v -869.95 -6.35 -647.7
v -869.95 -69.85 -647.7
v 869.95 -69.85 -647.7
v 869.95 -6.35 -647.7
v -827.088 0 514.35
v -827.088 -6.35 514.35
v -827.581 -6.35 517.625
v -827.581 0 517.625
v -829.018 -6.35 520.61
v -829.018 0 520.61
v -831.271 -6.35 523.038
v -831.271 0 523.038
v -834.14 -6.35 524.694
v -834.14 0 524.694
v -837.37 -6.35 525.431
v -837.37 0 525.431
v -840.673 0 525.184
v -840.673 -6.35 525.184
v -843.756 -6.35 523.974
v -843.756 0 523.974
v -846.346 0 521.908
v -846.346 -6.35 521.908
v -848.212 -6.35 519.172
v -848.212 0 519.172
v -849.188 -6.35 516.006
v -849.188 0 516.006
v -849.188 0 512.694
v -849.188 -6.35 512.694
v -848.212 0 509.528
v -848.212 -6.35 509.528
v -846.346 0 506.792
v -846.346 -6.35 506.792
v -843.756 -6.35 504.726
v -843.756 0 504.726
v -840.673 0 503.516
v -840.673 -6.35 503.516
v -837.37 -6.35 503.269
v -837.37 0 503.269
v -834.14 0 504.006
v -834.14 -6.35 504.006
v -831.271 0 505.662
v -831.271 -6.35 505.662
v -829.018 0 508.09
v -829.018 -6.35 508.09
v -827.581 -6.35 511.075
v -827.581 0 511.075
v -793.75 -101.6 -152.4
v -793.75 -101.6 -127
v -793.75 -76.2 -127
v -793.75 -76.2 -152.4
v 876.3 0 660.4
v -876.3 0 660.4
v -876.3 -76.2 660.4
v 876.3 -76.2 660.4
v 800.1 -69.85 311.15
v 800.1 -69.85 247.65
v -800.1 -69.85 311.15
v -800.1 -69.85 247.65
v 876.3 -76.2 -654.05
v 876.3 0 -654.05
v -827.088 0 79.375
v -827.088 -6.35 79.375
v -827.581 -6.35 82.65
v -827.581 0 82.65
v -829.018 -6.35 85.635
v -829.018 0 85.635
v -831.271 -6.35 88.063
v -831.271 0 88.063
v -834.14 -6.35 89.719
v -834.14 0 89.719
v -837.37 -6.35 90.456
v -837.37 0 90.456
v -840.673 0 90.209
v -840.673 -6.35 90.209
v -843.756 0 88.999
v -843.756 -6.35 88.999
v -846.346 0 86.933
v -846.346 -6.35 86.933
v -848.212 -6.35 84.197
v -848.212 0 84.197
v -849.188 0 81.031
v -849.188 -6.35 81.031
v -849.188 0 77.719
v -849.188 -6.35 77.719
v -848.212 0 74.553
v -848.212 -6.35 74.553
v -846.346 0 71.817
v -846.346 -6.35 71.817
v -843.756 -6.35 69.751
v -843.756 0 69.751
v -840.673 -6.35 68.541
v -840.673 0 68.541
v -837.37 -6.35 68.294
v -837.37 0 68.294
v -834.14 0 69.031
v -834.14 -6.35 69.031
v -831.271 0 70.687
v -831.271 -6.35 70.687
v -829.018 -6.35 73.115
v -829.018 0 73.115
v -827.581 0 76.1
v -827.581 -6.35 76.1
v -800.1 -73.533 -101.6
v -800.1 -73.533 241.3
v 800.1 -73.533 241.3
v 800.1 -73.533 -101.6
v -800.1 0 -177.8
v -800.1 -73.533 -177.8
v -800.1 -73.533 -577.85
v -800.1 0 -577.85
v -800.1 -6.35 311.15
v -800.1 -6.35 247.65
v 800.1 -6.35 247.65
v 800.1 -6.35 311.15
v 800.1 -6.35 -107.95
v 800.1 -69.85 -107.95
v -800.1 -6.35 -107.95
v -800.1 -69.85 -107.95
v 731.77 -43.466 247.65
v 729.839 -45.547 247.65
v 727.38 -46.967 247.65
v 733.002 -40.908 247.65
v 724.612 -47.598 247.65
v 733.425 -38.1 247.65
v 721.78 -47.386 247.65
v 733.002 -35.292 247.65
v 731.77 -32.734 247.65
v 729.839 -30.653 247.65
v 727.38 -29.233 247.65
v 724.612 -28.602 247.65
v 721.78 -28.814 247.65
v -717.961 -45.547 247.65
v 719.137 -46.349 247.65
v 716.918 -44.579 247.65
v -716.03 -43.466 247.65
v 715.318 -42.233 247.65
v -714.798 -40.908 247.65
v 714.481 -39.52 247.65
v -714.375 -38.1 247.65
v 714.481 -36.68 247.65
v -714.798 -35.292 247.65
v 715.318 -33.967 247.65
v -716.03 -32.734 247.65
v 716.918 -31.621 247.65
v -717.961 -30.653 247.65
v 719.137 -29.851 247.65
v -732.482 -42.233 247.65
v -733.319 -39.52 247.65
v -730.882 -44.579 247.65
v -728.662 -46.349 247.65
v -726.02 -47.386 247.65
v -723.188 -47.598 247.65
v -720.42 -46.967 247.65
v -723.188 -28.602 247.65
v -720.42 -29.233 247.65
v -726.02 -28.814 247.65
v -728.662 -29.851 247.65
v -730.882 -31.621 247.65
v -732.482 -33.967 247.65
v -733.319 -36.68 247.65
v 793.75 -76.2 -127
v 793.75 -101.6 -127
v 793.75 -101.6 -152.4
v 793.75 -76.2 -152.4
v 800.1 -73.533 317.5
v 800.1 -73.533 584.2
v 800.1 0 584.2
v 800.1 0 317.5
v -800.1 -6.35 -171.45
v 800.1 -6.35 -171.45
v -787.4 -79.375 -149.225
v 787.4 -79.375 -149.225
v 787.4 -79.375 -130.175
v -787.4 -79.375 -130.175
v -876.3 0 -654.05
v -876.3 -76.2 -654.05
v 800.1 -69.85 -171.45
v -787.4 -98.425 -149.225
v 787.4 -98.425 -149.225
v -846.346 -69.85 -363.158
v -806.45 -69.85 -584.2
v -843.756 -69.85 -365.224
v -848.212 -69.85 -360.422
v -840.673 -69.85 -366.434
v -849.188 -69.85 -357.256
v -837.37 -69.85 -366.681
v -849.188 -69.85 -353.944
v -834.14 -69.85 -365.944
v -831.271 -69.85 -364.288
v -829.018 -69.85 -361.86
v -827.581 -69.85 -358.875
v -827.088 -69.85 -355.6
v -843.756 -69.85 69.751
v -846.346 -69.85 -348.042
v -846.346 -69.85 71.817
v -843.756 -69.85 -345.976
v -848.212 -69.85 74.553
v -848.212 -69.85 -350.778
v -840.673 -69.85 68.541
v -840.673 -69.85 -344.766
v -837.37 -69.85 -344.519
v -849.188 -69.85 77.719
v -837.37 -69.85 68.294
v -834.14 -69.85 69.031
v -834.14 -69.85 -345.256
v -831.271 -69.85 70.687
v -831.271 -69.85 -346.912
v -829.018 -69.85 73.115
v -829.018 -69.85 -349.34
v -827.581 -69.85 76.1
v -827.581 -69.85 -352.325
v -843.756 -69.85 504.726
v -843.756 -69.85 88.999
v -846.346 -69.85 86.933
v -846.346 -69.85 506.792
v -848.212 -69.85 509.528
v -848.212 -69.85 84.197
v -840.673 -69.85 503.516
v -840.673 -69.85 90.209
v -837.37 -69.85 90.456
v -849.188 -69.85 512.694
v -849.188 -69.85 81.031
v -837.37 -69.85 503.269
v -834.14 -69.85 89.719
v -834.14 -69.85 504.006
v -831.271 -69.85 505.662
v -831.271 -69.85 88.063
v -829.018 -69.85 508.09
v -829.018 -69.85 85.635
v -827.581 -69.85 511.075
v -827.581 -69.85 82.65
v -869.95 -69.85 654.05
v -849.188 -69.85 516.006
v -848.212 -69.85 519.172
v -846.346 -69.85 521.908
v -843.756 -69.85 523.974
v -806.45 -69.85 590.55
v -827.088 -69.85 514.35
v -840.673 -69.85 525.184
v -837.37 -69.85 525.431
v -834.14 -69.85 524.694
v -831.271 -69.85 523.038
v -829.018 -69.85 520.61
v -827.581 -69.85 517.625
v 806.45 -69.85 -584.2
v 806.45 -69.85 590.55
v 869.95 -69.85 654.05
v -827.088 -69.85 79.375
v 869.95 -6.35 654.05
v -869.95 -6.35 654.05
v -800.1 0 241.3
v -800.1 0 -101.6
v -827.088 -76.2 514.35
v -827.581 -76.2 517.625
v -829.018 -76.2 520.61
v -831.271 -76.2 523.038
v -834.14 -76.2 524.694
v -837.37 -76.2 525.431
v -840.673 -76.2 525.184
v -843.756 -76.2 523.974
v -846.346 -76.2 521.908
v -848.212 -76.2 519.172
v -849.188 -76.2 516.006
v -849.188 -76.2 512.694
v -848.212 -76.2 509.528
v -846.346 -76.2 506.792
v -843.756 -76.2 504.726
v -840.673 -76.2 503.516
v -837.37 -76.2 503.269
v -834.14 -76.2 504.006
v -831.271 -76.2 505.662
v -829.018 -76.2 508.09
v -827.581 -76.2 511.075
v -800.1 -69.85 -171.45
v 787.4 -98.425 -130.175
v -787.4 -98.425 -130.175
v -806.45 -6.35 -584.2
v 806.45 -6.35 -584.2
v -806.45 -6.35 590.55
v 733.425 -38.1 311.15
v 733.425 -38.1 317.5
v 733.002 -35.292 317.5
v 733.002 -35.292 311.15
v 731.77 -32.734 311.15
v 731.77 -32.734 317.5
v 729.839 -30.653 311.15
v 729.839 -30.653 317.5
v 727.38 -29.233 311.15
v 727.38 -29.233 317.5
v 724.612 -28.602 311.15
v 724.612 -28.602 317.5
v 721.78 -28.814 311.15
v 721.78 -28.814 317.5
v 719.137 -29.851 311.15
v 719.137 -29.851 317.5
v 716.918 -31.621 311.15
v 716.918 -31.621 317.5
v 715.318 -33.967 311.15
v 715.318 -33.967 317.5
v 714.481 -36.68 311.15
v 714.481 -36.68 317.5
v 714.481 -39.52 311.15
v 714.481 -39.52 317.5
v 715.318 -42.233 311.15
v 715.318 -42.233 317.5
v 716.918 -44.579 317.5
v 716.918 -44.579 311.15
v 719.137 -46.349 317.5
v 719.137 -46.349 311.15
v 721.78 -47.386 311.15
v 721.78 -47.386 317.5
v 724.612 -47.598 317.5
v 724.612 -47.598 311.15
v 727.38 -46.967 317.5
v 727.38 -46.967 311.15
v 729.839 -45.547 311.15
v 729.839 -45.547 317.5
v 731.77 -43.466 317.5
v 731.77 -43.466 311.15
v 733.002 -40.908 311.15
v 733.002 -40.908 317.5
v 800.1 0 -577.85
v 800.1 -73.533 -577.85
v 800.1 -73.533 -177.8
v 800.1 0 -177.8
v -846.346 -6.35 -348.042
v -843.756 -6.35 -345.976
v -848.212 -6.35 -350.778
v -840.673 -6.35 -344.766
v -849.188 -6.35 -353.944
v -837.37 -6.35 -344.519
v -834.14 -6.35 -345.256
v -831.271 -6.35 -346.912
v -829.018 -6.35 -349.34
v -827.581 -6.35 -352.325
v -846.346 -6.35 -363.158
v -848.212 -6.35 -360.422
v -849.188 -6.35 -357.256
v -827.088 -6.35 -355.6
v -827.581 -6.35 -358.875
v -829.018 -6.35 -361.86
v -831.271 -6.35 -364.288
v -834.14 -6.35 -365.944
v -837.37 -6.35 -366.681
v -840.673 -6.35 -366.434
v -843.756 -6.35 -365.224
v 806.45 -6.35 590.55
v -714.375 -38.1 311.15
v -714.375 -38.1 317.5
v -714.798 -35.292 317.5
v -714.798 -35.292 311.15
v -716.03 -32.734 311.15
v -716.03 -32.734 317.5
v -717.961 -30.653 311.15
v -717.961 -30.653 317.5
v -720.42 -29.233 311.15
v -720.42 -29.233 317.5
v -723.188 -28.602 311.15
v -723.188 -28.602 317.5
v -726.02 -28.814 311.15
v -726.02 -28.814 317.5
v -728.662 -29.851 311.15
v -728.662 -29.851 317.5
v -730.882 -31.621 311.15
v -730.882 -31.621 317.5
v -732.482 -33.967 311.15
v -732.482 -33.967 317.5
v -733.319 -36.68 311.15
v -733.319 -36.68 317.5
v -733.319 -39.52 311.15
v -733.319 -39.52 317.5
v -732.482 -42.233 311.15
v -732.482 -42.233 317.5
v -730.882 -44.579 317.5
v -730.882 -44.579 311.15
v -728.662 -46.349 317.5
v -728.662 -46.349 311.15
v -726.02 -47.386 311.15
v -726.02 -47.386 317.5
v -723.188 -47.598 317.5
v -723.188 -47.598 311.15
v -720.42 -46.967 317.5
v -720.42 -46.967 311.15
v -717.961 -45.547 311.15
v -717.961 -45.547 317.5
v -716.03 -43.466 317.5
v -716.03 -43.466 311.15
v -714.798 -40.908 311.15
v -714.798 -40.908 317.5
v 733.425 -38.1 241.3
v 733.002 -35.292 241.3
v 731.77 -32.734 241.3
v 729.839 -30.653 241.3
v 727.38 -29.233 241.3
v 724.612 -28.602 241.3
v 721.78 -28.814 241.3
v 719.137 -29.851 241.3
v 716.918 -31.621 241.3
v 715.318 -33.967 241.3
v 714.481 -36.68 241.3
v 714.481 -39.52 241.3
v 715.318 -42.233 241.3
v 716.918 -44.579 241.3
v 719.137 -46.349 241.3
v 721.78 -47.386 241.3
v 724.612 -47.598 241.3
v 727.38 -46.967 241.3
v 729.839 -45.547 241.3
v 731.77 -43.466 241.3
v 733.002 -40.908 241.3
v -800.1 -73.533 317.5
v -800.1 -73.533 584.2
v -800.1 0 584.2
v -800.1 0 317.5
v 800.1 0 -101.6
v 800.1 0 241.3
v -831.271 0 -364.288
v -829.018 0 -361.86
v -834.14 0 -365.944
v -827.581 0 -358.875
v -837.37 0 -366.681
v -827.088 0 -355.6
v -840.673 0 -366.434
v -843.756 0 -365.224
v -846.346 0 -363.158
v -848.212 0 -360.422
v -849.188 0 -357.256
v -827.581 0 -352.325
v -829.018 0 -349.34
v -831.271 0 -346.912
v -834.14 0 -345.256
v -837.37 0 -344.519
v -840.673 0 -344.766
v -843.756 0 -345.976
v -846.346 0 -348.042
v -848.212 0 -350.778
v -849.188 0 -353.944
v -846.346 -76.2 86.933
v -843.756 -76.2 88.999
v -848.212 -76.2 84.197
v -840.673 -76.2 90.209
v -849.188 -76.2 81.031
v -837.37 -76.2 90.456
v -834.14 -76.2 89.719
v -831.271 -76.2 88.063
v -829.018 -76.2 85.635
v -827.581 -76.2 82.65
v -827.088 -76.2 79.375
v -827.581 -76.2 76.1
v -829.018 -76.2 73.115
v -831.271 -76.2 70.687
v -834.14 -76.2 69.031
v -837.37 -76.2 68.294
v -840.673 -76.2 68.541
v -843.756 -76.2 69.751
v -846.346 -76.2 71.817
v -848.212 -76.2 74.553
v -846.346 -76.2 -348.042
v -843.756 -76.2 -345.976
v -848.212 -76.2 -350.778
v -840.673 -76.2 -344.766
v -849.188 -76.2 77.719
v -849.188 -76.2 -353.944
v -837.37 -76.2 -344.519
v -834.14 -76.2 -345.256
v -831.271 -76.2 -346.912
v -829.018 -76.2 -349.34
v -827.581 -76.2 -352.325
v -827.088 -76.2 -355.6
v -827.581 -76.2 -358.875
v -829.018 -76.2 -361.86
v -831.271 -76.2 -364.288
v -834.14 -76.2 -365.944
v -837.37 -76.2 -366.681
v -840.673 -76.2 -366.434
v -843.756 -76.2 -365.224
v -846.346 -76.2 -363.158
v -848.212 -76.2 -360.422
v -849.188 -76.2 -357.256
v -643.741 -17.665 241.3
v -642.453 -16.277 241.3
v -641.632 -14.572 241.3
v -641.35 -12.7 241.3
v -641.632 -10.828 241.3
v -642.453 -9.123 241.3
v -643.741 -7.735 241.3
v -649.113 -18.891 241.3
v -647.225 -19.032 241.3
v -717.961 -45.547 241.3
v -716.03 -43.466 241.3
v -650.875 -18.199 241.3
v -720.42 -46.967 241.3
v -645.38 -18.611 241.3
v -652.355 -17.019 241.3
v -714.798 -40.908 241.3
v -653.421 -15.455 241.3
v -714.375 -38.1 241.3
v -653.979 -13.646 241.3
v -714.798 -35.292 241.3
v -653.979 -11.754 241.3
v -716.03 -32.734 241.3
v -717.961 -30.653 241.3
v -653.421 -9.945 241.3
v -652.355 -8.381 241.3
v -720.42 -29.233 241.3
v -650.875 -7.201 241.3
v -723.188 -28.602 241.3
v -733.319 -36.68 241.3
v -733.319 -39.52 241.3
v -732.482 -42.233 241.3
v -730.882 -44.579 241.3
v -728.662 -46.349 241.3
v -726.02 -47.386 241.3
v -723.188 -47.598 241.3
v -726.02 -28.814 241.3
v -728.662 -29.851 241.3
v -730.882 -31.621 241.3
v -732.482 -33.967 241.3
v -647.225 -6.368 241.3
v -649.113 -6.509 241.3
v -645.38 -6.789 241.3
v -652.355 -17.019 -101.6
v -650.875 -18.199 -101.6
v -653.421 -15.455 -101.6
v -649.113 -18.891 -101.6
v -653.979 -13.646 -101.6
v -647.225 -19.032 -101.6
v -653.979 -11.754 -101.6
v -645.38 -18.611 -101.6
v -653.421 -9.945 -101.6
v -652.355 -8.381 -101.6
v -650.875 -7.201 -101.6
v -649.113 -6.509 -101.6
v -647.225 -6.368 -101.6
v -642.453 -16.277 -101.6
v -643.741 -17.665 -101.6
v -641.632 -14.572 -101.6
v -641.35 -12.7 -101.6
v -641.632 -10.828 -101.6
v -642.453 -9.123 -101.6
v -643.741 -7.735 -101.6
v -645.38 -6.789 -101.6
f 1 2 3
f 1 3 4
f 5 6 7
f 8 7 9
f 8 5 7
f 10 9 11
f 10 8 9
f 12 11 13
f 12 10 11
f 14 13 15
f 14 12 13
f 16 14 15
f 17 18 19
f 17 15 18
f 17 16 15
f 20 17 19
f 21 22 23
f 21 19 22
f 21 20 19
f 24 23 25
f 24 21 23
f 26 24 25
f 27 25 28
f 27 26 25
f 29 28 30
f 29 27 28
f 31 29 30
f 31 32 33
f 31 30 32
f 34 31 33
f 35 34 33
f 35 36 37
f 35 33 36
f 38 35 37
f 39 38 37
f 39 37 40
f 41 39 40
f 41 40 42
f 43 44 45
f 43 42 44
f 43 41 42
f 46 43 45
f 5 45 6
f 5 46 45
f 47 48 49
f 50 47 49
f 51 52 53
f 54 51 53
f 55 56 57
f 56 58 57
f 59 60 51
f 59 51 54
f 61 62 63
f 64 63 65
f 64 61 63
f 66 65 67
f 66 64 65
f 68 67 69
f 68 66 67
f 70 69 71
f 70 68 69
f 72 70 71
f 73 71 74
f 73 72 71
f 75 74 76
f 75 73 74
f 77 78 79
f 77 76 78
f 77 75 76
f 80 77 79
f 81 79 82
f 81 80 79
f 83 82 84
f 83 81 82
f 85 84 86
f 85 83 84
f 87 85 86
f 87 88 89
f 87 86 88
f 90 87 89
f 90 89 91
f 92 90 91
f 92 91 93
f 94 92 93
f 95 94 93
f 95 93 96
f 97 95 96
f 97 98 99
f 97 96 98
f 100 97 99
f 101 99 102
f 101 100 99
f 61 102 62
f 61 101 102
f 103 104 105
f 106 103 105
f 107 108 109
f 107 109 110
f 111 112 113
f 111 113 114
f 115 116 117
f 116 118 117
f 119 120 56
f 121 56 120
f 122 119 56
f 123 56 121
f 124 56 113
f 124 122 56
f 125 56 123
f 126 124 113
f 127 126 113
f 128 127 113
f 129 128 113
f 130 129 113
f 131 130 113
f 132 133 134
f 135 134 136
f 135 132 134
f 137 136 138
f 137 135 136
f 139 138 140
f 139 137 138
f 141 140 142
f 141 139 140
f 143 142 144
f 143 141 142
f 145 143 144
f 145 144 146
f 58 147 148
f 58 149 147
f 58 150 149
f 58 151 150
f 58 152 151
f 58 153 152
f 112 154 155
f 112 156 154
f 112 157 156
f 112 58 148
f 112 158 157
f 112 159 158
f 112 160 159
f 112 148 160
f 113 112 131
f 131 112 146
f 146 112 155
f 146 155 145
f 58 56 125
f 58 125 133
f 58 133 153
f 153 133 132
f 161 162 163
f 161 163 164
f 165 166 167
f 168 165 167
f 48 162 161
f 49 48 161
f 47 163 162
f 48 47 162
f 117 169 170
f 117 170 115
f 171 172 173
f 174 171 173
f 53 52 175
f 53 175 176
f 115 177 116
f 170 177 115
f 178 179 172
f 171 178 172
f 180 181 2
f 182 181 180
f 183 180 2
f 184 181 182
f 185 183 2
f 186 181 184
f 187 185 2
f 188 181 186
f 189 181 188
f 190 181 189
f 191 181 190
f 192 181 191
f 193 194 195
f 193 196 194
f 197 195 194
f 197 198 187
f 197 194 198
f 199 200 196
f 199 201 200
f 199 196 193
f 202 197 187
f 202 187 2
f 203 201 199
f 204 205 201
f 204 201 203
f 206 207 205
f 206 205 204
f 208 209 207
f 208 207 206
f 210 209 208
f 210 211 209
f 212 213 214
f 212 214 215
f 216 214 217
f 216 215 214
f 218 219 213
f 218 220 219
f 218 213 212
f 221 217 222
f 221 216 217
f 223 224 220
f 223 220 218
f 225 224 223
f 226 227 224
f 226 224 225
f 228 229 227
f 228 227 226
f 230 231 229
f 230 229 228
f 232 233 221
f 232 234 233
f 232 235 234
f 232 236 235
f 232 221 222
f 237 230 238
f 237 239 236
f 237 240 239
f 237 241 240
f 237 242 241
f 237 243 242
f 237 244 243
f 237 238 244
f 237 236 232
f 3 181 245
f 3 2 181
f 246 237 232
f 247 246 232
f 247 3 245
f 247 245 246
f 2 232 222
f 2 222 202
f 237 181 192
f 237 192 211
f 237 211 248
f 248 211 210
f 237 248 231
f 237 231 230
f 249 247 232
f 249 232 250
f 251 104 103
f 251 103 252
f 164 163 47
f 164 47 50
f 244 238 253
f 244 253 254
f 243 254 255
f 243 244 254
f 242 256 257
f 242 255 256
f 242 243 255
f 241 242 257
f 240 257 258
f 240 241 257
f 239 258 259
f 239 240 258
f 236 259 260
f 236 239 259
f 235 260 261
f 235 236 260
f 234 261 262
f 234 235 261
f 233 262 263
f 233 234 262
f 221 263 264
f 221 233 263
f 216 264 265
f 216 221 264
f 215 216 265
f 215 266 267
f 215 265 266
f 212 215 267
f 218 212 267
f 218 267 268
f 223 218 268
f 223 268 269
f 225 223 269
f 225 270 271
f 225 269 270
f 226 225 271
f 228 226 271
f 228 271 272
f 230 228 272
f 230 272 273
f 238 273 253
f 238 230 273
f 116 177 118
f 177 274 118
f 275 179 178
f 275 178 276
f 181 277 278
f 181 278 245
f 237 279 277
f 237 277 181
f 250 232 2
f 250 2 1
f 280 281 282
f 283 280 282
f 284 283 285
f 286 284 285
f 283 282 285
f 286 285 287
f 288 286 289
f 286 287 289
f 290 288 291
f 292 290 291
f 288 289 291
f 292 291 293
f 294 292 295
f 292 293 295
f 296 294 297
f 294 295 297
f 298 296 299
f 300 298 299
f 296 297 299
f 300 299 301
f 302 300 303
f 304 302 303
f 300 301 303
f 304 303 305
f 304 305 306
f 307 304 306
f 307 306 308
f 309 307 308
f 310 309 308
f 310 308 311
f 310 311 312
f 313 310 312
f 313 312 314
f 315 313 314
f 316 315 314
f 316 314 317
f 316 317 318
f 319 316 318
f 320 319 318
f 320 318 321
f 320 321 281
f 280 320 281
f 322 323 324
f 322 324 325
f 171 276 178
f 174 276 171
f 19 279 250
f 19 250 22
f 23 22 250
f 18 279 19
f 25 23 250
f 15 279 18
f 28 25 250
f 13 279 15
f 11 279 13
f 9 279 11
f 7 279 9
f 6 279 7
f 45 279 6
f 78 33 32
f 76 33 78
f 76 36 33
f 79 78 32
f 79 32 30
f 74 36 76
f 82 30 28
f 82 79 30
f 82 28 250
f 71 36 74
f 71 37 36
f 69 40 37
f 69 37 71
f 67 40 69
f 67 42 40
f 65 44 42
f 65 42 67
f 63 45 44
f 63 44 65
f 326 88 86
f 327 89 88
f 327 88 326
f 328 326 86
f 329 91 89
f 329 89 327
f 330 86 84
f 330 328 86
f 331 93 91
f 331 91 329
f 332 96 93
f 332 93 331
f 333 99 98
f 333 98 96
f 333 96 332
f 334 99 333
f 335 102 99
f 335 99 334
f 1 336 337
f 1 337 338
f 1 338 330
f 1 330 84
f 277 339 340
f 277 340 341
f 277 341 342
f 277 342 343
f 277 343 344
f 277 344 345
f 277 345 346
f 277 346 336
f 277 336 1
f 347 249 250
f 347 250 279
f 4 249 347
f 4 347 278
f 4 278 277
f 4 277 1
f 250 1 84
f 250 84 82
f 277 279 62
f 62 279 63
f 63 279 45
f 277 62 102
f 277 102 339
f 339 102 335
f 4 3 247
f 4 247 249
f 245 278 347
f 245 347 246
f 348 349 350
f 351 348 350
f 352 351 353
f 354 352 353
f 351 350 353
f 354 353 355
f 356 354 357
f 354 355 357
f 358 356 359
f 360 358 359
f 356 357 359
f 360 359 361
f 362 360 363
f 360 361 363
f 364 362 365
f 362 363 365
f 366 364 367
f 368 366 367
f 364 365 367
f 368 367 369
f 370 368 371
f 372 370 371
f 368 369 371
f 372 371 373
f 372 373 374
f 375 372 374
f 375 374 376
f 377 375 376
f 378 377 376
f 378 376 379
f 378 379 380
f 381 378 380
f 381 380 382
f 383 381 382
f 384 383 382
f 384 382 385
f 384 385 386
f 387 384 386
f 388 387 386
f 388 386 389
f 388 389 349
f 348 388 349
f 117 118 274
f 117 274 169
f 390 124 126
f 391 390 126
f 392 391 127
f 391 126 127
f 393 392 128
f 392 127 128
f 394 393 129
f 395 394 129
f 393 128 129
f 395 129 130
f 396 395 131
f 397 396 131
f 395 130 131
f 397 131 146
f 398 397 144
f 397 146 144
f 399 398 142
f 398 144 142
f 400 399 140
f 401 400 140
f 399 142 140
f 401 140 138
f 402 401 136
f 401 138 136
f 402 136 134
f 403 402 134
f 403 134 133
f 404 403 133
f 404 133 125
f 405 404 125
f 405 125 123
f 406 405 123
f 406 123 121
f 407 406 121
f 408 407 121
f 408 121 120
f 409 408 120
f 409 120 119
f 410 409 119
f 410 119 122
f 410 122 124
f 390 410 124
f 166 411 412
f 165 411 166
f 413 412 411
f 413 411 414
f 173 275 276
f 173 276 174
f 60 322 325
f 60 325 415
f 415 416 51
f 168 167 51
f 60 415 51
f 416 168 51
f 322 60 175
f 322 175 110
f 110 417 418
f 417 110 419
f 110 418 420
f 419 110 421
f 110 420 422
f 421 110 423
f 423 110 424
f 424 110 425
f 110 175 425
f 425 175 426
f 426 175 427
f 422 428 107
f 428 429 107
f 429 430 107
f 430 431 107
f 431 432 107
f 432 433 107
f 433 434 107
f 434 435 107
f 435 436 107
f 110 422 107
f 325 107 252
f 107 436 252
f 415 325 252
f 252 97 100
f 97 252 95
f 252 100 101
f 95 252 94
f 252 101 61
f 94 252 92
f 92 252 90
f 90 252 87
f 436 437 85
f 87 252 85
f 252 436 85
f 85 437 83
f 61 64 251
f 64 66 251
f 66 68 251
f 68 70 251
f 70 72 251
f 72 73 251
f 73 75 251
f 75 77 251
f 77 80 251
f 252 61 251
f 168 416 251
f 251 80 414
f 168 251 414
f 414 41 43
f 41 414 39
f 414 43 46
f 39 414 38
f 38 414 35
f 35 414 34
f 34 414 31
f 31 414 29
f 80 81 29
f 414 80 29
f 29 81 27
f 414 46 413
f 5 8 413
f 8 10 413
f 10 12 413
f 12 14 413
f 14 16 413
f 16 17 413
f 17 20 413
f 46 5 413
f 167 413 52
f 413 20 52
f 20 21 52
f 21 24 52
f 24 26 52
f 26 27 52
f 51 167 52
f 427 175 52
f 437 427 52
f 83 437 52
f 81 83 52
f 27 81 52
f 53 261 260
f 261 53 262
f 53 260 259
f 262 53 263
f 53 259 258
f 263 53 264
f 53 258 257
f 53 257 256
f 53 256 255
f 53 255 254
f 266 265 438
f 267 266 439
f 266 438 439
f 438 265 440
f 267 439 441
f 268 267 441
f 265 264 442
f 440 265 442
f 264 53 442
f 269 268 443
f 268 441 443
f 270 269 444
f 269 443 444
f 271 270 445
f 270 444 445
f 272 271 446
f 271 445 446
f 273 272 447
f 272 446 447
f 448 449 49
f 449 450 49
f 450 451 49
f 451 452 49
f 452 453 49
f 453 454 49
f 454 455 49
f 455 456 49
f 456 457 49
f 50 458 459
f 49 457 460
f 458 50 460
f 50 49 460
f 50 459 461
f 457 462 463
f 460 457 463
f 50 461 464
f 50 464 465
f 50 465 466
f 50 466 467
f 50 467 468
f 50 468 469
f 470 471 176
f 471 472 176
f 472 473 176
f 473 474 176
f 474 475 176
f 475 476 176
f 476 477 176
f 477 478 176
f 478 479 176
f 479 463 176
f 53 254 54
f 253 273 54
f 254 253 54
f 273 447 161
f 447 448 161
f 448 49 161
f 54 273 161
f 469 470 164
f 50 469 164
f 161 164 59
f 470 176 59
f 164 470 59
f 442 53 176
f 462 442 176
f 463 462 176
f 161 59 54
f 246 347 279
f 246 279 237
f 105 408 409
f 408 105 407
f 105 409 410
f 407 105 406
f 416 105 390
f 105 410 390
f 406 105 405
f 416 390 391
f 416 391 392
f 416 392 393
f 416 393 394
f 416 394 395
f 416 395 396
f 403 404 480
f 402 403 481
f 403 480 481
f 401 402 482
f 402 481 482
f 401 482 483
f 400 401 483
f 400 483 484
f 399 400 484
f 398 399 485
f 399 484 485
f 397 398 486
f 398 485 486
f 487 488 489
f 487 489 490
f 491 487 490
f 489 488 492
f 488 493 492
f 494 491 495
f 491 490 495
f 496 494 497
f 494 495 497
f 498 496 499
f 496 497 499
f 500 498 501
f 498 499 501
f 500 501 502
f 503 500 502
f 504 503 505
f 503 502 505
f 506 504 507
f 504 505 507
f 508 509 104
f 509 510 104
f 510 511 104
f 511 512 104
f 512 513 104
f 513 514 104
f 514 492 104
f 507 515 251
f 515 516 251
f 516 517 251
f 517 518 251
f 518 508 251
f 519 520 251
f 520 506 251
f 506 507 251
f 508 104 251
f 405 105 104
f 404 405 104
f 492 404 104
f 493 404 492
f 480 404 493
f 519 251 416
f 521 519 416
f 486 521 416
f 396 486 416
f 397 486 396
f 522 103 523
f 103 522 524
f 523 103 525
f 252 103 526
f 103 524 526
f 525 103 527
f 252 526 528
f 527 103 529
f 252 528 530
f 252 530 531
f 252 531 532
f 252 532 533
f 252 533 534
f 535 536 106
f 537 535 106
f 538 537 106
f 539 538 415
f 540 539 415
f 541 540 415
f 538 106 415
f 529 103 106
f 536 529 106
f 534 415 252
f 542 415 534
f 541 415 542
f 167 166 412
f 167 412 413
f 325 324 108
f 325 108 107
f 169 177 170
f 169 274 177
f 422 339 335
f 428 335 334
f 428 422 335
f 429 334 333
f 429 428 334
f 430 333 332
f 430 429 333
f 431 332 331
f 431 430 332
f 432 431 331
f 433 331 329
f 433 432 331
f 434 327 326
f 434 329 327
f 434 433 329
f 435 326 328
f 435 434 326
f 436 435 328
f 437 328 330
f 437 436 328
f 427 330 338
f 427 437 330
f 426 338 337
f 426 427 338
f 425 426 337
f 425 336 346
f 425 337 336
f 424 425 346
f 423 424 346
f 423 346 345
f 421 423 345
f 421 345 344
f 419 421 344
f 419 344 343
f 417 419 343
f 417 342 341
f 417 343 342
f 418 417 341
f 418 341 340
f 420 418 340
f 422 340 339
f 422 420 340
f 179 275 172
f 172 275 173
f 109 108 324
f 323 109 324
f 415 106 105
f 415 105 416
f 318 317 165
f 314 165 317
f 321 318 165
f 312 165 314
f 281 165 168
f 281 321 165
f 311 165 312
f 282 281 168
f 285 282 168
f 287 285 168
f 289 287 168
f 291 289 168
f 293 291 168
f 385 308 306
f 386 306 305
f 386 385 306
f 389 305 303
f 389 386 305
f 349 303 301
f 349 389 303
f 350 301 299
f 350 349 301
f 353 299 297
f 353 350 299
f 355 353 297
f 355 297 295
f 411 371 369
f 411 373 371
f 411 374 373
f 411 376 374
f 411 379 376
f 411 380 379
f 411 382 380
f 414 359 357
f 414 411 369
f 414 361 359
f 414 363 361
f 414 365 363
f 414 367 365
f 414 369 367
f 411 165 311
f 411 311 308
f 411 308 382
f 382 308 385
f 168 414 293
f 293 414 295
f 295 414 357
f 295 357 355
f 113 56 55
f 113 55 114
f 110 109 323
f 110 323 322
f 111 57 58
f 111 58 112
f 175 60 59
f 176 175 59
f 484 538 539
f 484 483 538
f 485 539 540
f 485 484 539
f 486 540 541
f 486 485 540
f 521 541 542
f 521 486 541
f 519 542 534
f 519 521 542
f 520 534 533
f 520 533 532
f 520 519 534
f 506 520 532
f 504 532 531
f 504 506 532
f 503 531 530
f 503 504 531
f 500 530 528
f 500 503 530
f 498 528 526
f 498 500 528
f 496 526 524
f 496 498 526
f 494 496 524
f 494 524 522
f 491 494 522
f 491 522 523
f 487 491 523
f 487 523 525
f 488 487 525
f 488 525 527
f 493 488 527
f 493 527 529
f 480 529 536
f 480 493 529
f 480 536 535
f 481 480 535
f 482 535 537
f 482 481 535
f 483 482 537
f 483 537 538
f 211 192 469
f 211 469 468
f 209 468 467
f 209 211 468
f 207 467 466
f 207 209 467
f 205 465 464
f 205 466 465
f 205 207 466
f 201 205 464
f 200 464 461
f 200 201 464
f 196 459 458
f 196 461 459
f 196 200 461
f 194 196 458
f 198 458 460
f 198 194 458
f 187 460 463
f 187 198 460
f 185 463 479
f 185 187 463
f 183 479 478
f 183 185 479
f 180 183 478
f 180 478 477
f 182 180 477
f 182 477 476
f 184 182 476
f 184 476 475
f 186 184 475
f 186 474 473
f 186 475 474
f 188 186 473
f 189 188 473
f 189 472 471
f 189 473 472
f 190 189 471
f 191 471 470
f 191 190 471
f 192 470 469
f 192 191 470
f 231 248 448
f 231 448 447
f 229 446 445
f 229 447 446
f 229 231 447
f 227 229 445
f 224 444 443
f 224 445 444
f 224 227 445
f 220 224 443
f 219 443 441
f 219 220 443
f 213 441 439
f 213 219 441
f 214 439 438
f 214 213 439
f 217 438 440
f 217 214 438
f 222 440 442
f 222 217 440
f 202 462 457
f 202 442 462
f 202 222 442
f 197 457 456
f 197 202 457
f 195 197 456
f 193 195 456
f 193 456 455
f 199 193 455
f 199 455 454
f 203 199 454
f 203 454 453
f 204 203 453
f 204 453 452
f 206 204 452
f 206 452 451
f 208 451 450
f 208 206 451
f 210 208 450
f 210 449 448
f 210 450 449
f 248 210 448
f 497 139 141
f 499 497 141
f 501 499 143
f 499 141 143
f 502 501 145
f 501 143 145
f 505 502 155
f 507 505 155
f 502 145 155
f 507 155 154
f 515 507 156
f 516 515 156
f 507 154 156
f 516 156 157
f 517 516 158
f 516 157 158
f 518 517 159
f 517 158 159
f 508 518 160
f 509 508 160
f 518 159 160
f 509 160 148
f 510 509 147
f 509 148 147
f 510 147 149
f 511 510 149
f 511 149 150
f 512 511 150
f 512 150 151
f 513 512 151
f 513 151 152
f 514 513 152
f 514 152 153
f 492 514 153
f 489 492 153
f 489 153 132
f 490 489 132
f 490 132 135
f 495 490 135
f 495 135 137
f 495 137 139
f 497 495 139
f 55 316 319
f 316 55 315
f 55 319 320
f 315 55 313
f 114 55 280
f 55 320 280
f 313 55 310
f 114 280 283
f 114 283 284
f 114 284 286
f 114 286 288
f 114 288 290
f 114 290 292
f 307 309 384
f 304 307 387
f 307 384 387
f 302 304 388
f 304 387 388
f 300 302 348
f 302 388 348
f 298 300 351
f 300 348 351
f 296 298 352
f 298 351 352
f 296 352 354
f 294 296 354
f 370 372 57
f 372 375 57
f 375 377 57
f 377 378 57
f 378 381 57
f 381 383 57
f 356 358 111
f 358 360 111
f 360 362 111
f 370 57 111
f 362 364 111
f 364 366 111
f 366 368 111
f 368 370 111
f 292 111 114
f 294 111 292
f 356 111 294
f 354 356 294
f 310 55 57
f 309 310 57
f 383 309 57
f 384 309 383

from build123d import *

# Parameters (mm, degrees)
F1_W           = 76.2
F1_H           = 76.2
F1_W_2         = 63.5
F1_H_2         = 63.5
F3_W           = 76.2
F3_H           = 76.2
F3_W_2         = 63.5
F3_H_2         = 63.5
F4_DEPTH       = 800.1
F4_DEPTH_BACK  = 800.1
F5_W           = 25.4
F5_H           = 25.4
F5_W_2         = 19.05
F5_H_2         = 19.05
F6_DEPTH       = 793.75
F7_W           = 6.35
F7_H           = 25.4
F8_DEPTH       = 25.4
F9_W           = 1600.2
F9_H           = 2.667
F10_DEPTH      = 660.4
F10_DEPTH_BACK = 654.05
F11_R          = 11.1125
F12_DEPTH      = 101.601
F13_R          = 9.525
F14_DEPTH      = 76.2
F15_R          = 6.35
F16_DEPTH      = 241.3
F16_DEPTH_BACK = 101.6


# Not quite as in the source:
# - an extrude ends at something that could not be found from the text; its depth is read off the source's solid


with BuildPart() as f2:
    # F2: sweep along a path in F0
    with BuildLine(Plane.XZ) as f2_path:
        Line((-876.3, 660.4), (876.3, 660.4))
        Line((876.3, 660.4), (876.3, -654.05))
        Line((876.3, -654.05), (-876.3, -654.05))
        Line((-876.3, -654.05), (-876.3, 660.4))
    # F1 (on Top) → F2 (sweep)
    with BuildSketch(Plane.XY):
        with Locations((-838.2, -38.1)):
            Rectangle(F1_W, F1_H)
        with Locations((-838.2, -38.1)):
            Rectangle(F1_W_2, F1_H_2, mode=Mode.SUBTRACT)
    sweep(path=f2_path.line, transition=Transition.RIGHT)

    # F3 (on Right) → F4 (join, two sides)
    with BuildSketch(Plane.YZ) as f4_sk:
        with Locations((-38.1, 279.4)):
            Rectangle(F3_W, F3_H)
        with Locations((-38.1, 279.4)):
            Rectangle(F3_W_2, F3_H_2, mode=Mode.SUBTRACT)
        with Locations((-38.1, -139.7)):
            Rectangle(F3_W, F3_H)
        with Locations((-38.1, -139.7)):
            Rectangle(F3_W_2, F3_H_2, mode=Mode.SUBTRACT)
    extrude(amount=-F4_DEPTH)
    extrude(f4_sk.sketch, amount=F4_DEPTH_BACK)

    # F5 (on Right) → F6 (join, symmetric)
    with BuildSketch(Plane.YZ):
        with Locations((-88.9, -139.7)):
            Rectangle(F5_W, F5_H)
        with Locations((-88.9, -139.7)):
            Rectangle(F5_W_2, F5_H_2, mode=Mode.SUBTRACT)
    extrude(amount=F6_DEPTH, both=True)

    # F7 (on face) → F8 (join, through all)
    with BuildSketch(Plane.XY.offset(-127)):
        with Locations((790.575, -88.9)):
            Rectangle(F7_W, F7_H)
        with Locations((-790.575, -88.9)):
            Rectangle(F7_W, F7_H)
    extrude(amount=-F8_DEPTH)

    # F9 (on Top) → F10 (join, two sides)
    with BuildSketch(Plane.XY) as f10_sk:
        with Locations((0, -74.8665)):
            Rectangle(F9_W, F9_H)
    extrude(amount=F10_DEPTH)
    extrude(f10_sk.sketch, amount=-F10_DEPTH_BACK)

    # F11 (on Front) → F12 (cut, through all)
    with BuildSketch(Plane.XZ):
        with Locations((-838.2, 514.35)):
            Circle(F11_R)
        with Locations((-838.2, 79.375)):
            Circle(F11_R)
        with Locations((-838.2, -355.6)):
            Circle(F11_R)
    extrude(amount=F12_DEPTH, mode=Mode.SUBTRACT)

    # F13 (on face) → F14 (cut, through all)
    with BuildSketch(Plane.XY.offset(317.5)):
        with Locations((-723.9, -38.1)):
            Circle(F13_R)
        with Locations((723.9, -38.1)):
            Circle(F13_R)
    extrude(amount=-F14_DEPTH, mode=Mode.SUBTRACT)

    # F15 (on Top) → F16 (join, two sides)
    with BuildSketch(Plane.XY) as f16_sk:
        with Locations((-647.7, -12.7)):
            Circle(F15_R)
    extrude(amount=F16_DEPTH)
    extrude(f16_sk.sketch, amount=-F16_DEPTH_BACK)


solid = f2.part
